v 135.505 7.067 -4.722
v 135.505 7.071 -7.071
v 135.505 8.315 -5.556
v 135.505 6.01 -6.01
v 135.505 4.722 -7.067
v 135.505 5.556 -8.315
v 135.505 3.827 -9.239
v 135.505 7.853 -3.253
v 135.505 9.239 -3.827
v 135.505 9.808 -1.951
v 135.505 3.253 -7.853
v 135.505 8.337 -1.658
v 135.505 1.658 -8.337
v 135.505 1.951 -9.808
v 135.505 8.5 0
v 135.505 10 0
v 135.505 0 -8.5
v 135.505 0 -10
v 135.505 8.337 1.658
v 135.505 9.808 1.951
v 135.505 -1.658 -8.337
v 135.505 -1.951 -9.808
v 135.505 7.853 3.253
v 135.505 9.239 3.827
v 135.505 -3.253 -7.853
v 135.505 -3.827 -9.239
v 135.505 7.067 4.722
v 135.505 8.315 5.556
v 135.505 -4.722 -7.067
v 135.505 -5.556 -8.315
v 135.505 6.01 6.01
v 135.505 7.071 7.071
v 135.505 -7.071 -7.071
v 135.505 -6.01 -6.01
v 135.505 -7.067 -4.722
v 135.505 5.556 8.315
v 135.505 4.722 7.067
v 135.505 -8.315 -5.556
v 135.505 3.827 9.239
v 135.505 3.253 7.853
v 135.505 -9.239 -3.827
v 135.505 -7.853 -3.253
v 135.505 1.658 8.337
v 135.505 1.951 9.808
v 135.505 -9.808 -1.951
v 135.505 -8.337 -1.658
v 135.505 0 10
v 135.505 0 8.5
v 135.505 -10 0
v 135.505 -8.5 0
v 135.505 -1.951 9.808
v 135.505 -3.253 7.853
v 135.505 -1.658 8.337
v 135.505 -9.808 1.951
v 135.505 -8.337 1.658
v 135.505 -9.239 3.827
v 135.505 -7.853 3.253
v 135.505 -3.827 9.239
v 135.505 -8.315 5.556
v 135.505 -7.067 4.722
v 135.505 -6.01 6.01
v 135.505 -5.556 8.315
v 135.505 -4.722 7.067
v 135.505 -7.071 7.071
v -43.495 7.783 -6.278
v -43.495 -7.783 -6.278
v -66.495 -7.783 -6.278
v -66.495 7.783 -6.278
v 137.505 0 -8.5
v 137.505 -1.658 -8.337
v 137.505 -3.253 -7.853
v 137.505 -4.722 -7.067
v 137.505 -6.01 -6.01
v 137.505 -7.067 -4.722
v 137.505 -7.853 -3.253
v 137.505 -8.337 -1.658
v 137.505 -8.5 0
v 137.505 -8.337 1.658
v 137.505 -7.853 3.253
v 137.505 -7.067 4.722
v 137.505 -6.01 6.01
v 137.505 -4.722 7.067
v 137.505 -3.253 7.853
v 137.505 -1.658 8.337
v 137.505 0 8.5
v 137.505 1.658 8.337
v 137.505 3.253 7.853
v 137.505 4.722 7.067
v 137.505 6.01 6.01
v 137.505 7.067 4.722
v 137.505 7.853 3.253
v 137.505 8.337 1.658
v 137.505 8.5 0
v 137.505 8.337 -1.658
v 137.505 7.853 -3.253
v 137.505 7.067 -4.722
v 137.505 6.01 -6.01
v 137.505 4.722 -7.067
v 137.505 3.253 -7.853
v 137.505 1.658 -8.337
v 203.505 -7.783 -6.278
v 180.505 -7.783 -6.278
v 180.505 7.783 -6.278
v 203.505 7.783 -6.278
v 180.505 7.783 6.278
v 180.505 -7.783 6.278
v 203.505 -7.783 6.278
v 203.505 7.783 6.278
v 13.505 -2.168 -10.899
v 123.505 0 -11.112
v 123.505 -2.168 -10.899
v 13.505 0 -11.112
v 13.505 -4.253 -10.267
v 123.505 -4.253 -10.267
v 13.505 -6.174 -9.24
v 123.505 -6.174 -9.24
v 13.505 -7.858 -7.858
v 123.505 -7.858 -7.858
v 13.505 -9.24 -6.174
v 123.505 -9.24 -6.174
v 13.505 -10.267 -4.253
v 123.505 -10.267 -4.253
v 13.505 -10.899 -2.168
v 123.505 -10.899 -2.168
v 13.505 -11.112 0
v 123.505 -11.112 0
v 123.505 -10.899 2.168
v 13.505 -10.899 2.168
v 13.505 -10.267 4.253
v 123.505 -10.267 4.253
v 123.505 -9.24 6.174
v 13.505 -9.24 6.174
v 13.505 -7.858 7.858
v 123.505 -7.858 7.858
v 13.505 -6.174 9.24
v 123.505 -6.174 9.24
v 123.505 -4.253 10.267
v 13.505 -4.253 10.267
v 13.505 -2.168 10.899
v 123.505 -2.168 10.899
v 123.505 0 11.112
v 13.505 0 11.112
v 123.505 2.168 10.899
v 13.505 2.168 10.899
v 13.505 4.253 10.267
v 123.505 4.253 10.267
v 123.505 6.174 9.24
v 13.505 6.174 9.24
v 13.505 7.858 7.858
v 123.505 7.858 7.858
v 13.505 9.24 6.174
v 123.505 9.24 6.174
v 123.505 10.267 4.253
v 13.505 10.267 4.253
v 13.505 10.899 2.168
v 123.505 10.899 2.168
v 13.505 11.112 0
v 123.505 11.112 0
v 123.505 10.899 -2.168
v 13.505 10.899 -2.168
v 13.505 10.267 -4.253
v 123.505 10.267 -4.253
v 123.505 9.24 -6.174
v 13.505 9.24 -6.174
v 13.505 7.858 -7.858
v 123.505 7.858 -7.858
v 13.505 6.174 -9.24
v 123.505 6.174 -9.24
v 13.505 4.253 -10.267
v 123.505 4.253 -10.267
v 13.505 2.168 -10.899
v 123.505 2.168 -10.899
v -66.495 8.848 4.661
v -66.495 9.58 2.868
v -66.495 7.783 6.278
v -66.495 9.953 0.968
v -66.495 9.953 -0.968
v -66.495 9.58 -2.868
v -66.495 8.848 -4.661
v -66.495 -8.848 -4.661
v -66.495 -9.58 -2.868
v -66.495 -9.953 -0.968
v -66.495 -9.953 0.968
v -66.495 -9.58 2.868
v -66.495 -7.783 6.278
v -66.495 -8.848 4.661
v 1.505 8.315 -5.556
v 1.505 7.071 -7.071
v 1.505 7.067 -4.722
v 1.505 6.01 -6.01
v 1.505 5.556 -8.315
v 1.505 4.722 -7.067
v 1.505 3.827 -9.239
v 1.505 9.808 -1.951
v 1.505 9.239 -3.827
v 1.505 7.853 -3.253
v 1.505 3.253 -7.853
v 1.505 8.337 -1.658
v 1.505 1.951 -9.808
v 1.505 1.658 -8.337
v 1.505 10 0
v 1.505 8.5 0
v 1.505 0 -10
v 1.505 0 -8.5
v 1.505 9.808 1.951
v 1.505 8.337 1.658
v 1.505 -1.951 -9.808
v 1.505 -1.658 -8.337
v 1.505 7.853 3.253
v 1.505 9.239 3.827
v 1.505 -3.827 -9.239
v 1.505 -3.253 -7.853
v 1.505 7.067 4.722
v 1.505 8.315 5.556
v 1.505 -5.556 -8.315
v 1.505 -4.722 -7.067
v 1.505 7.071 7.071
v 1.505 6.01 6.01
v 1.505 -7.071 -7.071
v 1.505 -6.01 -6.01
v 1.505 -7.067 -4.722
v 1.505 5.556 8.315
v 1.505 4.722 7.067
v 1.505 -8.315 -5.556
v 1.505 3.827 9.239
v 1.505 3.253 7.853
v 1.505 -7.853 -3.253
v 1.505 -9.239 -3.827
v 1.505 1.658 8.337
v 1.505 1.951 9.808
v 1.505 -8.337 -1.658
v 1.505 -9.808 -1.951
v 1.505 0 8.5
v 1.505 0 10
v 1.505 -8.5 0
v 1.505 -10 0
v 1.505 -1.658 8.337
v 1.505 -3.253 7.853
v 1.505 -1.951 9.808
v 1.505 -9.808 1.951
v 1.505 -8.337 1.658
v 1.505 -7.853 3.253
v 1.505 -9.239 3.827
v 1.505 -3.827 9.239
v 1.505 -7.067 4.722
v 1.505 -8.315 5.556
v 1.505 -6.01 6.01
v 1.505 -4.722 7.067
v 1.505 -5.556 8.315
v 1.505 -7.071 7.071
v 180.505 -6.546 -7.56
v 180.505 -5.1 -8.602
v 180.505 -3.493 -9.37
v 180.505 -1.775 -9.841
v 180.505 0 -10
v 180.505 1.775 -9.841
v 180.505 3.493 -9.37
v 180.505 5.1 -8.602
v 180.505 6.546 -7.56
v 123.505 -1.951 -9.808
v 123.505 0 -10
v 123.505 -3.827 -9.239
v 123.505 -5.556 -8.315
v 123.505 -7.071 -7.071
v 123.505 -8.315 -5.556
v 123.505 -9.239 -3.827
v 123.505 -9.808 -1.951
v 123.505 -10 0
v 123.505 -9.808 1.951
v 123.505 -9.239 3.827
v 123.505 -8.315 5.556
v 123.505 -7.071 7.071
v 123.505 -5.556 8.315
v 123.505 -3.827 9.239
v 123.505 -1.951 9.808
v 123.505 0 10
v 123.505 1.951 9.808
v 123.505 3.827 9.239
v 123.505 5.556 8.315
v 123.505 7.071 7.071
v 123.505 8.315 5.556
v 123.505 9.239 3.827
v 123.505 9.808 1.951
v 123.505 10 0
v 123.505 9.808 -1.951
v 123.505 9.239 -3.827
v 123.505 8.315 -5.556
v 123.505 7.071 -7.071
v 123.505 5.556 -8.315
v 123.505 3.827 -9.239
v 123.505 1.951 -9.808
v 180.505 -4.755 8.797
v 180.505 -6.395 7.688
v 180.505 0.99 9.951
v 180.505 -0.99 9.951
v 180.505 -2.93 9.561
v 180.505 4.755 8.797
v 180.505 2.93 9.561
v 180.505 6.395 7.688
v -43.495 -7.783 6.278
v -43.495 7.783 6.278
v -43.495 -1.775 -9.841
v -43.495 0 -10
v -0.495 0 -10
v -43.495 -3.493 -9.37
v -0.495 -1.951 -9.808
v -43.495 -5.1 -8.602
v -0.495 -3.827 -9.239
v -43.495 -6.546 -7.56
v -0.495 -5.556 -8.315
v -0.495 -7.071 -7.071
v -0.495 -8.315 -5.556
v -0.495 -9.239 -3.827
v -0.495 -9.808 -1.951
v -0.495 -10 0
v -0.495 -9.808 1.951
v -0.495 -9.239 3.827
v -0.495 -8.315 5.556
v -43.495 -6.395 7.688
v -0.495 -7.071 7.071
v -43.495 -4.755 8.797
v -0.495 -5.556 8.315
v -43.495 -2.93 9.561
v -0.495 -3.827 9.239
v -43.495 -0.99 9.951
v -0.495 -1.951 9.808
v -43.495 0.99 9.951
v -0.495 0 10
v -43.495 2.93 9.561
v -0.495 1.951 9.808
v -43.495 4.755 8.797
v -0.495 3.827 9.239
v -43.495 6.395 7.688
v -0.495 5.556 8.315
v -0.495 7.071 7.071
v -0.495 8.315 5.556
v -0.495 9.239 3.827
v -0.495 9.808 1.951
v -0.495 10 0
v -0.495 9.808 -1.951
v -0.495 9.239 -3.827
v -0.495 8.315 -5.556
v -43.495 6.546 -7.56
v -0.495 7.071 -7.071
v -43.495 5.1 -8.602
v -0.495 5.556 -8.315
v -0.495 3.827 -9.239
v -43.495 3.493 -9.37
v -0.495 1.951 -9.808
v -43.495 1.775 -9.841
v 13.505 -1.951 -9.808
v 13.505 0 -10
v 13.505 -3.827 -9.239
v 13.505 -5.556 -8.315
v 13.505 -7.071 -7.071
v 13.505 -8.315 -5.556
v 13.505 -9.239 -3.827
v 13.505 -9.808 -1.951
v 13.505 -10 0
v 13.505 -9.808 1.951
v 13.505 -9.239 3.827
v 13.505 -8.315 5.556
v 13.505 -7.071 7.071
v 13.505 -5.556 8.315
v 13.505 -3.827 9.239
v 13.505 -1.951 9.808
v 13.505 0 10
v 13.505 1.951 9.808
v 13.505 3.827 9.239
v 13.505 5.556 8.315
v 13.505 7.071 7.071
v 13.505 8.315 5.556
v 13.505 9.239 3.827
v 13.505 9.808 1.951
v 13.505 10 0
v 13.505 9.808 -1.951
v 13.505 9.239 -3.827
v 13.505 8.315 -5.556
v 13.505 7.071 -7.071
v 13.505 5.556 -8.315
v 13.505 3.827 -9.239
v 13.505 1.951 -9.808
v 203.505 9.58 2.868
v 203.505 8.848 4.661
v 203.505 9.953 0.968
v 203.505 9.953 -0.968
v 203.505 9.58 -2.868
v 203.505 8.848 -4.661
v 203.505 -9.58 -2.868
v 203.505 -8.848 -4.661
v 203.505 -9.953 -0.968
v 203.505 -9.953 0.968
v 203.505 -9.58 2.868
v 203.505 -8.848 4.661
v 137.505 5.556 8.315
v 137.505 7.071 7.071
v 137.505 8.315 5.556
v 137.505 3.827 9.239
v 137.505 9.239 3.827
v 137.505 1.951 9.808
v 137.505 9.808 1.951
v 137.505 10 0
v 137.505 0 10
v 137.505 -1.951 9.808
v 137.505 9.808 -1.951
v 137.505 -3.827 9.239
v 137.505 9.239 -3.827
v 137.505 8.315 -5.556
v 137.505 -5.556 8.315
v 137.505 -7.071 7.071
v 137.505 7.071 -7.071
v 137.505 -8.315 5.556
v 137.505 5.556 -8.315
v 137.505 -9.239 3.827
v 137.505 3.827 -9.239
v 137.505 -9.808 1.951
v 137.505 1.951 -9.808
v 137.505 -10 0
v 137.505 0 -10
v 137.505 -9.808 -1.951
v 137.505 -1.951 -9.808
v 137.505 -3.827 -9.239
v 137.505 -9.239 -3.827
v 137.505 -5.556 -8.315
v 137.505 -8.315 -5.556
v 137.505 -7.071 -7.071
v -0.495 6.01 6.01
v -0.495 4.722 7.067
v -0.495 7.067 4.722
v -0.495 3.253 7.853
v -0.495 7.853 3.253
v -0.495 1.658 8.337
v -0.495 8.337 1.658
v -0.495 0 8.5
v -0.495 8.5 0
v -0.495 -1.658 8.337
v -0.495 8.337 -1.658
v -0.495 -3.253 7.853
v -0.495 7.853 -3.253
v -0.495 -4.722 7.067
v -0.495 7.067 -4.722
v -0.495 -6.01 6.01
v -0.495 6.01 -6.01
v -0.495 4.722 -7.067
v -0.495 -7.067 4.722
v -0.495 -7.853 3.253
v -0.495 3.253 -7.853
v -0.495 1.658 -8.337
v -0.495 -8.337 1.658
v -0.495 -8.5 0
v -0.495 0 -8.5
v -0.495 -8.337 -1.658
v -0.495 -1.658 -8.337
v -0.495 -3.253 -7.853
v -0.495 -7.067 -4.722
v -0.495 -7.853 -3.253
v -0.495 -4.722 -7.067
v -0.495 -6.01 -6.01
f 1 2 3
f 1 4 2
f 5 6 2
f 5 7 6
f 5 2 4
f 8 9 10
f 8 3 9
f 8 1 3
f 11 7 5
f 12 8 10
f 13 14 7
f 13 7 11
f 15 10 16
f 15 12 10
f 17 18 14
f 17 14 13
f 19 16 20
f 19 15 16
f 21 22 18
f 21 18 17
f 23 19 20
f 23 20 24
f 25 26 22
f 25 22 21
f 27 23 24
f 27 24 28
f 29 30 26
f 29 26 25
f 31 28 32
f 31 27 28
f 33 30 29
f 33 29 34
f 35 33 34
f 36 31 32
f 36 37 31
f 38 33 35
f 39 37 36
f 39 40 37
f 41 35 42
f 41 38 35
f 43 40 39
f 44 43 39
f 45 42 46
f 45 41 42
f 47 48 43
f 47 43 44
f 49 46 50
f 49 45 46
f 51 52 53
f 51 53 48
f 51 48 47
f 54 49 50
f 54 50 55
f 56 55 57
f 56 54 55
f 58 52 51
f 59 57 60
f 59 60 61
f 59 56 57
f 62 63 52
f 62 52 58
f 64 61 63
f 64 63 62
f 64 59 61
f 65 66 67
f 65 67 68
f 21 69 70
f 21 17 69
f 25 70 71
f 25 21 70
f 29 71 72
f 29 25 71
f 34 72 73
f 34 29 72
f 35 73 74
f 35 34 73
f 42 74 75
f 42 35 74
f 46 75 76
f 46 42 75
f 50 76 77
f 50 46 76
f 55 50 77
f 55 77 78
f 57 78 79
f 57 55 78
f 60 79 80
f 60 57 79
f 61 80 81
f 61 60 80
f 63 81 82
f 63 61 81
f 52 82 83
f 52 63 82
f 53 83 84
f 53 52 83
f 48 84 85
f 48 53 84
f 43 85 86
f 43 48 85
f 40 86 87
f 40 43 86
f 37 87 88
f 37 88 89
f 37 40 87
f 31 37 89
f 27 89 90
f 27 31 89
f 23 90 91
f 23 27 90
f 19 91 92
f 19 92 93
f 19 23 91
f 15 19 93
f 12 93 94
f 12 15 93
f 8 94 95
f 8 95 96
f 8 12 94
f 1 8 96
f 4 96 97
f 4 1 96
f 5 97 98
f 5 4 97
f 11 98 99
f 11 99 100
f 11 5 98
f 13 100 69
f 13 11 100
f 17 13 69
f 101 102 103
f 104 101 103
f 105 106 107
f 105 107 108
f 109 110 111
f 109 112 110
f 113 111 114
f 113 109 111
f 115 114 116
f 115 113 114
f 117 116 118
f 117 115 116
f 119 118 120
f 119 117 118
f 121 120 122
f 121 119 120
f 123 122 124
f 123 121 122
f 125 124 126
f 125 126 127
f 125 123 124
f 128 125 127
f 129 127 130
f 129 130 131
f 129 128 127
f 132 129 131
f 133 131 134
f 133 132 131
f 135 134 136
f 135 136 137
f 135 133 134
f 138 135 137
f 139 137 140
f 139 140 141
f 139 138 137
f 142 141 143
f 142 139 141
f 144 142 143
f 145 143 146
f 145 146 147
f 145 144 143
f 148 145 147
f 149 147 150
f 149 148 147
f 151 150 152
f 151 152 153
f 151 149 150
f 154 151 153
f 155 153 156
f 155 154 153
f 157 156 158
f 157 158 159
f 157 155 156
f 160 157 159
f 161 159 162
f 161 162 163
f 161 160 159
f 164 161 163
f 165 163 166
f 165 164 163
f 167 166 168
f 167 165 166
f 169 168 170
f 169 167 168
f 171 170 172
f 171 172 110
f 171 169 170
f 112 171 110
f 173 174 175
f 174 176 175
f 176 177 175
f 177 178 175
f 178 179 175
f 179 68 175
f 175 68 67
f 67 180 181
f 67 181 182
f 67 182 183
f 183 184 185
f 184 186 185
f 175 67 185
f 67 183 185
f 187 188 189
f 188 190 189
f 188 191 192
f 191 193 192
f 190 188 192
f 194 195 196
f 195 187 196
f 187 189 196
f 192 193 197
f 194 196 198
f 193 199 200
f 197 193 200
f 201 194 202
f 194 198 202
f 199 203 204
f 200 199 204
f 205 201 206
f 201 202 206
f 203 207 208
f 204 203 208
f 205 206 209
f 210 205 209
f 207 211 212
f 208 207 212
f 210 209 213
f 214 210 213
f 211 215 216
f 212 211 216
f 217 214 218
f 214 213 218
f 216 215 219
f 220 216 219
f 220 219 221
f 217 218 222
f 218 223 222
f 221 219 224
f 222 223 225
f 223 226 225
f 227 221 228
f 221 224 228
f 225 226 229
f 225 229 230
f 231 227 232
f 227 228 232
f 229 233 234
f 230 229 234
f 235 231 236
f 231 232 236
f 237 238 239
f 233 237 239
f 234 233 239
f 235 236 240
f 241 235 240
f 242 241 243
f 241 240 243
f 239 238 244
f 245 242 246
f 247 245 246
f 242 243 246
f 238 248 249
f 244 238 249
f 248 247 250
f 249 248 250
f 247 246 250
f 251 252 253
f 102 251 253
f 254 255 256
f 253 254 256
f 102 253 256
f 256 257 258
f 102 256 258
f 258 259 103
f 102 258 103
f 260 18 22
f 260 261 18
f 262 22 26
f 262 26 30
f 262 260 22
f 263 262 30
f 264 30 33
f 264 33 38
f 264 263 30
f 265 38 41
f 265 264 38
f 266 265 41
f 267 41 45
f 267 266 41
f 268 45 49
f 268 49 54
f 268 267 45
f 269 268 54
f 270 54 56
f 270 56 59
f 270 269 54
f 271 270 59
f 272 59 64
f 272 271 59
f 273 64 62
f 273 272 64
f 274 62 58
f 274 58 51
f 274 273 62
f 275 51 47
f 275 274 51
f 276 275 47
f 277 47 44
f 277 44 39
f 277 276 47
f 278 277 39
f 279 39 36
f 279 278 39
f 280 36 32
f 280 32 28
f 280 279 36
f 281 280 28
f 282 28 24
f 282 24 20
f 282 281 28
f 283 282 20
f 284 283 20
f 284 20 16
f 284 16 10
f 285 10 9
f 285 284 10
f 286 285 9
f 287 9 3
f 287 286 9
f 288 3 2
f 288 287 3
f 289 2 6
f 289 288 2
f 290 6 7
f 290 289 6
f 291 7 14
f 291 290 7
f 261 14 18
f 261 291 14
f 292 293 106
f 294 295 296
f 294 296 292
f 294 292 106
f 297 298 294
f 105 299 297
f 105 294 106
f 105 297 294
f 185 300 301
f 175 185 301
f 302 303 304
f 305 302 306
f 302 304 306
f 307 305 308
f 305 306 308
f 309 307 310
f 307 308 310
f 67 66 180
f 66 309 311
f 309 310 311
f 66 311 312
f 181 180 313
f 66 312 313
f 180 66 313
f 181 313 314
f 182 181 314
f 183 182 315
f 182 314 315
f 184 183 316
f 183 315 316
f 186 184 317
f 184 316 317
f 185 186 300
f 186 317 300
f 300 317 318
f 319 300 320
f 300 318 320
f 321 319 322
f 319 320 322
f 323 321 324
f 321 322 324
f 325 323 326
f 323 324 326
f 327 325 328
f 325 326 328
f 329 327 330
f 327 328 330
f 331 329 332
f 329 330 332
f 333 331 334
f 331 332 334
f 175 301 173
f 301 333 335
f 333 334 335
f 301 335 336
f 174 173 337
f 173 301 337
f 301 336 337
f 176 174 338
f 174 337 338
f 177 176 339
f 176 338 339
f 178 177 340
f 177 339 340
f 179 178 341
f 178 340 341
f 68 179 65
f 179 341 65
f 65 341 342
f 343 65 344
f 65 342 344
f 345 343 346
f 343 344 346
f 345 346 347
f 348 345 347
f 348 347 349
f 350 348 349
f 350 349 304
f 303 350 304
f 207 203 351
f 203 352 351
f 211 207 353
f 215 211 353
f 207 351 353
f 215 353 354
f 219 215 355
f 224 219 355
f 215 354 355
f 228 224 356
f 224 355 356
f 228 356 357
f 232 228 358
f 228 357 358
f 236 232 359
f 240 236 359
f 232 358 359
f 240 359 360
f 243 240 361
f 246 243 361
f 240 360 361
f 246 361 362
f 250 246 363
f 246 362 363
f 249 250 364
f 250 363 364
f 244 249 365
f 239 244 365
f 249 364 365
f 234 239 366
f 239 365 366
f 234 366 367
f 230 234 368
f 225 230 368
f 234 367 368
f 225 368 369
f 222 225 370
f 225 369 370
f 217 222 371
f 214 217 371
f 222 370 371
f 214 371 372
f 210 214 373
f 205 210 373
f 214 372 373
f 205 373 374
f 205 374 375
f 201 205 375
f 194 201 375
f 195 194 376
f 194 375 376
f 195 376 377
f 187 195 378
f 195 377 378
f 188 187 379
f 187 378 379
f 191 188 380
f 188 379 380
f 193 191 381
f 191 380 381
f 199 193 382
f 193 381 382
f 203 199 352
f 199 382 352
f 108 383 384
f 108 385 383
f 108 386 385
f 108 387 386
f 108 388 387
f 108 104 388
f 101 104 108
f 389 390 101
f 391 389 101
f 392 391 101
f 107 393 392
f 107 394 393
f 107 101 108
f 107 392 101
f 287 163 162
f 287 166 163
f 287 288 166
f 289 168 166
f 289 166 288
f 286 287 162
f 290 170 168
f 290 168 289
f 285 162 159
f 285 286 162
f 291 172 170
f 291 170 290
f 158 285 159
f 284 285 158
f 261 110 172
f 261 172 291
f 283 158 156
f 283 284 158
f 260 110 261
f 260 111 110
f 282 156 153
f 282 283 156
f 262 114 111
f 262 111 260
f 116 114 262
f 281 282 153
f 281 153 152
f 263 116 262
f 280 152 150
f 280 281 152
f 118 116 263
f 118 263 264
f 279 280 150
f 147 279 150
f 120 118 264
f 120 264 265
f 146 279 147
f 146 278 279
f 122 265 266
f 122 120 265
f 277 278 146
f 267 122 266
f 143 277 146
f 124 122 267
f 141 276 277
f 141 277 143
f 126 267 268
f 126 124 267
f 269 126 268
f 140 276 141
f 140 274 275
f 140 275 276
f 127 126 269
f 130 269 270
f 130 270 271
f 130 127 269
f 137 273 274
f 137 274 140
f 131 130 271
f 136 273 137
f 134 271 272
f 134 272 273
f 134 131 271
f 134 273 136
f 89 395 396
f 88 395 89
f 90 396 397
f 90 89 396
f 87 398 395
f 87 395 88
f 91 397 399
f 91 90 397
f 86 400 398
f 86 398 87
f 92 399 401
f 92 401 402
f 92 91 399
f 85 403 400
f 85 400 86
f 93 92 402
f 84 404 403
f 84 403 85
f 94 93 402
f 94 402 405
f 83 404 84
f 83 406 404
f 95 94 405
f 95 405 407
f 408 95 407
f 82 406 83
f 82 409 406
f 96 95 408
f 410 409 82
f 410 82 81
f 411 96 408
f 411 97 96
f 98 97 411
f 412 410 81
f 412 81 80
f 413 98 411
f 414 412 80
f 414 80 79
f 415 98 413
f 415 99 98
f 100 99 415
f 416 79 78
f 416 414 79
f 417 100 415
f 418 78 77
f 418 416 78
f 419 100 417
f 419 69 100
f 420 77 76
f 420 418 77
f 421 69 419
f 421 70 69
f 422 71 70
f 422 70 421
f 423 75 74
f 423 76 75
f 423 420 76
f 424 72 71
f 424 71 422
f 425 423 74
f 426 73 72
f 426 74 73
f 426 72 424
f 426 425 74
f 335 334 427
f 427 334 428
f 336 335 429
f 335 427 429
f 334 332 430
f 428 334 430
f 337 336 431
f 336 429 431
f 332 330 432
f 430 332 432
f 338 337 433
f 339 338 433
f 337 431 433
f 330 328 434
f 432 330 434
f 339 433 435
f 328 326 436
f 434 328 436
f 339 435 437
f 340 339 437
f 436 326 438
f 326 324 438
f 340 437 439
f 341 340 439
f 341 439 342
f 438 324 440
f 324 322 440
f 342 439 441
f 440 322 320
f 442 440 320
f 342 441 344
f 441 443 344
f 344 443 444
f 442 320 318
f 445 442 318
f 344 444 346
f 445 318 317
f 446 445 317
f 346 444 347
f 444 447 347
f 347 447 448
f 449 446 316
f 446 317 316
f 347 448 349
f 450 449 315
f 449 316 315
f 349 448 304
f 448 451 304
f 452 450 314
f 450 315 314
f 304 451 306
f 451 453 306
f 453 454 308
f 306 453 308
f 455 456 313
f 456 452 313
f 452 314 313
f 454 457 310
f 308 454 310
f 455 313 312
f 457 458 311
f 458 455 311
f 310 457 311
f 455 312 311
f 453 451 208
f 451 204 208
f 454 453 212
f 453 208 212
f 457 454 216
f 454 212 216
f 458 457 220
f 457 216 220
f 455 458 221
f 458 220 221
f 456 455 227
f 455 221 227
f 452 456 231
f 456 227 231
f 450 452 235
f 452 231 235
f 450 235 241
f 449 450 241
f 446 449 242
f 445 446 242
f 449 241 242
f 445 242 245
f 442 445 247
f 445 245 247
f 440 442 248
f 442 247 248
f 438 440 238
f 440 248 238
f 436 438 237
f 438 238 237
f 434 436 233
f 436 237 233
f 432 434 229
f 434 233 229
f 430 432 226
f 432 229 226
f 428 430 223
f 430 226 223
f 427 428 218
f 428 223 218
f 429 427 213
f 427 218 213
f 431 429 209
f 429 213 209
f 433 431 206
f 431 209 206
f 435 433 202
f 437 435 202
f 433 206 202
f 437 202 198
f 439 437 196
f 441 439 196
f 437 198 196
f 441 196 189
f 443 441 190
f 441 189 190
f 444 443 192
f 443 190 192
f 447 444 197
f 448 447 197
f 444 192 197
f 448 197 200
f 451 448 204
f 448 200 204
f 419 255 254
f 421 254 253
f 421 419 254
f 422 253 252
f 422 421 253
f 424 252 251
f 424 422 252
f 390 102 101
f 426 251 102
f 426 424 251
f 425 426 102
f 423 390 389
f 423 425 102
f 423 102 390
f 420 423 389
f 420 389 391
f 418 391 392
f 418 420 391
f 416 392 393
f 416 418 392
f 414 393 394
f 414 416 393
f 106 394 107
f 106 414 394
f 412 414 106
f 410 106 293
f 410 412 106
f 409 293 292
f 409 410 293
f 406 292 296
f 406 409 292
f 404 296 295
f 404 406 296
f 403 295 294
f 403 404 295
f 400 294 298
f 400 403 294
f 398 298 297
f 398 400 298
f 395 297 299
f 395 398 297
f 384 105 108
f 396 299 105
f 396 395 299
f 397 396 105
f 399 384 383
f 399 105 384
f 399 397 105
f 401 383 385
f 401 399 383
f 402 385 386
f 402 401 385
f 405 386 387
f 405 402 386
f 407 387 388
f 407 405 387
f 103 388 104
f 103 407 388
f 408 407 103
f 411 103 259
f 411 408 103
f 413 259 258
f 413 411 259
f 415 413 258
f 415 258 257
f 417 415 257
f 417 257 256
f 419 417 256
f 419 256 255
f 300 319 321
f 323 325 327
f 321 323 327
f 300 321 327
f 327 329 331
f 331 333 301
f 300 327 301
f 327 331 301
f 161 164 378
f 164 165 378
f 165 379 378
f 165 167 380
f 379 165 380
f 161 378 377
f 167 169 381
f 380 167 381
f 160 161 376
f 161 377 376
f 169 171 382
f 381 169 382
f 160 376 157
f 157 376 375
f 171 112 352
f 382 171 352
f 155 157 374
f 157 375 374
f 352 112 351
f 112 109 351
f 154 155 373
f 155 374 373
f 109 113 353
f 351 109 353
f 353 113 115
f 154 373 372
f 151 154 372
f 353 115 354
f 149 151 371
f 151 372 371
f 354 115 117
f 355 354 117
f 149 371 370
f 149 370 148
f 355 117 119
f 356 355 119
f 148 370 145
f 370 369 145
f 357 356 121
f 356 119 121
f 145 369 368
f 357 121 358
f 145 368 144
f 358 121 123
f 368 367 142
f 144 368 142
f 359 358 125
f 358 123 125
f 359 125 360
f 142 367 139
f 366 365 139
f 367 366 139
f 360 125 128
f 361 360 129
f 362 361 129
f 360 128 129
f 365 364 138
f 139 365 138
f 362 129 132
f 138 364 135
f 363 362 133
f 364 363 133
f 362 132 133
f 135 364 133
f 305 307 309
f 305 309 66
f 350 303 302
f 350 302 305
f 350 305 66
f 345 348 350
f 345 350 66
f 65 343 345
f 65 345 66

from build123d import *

# Parameters (mm, degrees)
CORTAR_EXTRUIR1_START = -23
CORTAR_EXTRUIR1_DEPTH = 23


with BuildPart() as part:
    # Croquis1 → Revolución1 (revolve)
    with BuildSketch(Plane.XY, mode=Mode.PRIVATE) as revoluci_n1_sk:
        Polygon((13.505191192, 11.1125), (68.505191192, 11.1125), (68.505191192, 0), (-66.494808808, 0), (-66.494808808, 10), (-0.494808808, 10), (-0.494808808, 8.5), (1.505191192, 8.5), (1.505191192, 10), (13.505191192, 10), align=None)
    revoluci_n1 = revolve(revoluci_n1_sk.sketch.rotate(Axis((70.414965315, 0, 0), (-1, 0, 0)), 90), axis=Axis((70.414965315, 0, 0), (-1, 0, 0)))

    # Croquis2 → Cortar-Extruir1 (cut)
    with BuildSketch(Plane.ZY.offset(66.494808808).offset(CORTAR_EXTRUIR1_START)):
        with BuildLine():
            Line((-6.278365003, -7.783452504), (-6.278365003, 7.783452504))
            ThreePointArc((-6.278365003, 7.783452504), (-10, 0), (-6.278365003, -7.783452504))
        make_face()
        with BuildLine():
            Line((6.278365003, -7.783452504), (6.278365003, 7.783452504))
            ThreePointArc((6.278365003, 7.783452504), (10, 0), (6.278365003, -7.783452504))
        make_face()
    cortar_extruir1 = extrude(amount=CORTAR_EXTRUIR1_DEPTH, mode=Mode.SUBTRACT)

    # Simetría2: Revolución1, Cortar-Extruir1 across plane
    add(revoluci_n1.mirror(Plane(origin=(68.505191192, 11.1125, 0), x_dir=(0, 0, 1), z_dir=(1, 0, 0))))
    add(cortar_extruir1.mirror(Plane(origin=(68.505191192, 11.1125, 0), x_dir=(0, 0, 1), z_dir=(1, 0, 0))), mode=Mode.SUBTRACT)


solid = part.part
